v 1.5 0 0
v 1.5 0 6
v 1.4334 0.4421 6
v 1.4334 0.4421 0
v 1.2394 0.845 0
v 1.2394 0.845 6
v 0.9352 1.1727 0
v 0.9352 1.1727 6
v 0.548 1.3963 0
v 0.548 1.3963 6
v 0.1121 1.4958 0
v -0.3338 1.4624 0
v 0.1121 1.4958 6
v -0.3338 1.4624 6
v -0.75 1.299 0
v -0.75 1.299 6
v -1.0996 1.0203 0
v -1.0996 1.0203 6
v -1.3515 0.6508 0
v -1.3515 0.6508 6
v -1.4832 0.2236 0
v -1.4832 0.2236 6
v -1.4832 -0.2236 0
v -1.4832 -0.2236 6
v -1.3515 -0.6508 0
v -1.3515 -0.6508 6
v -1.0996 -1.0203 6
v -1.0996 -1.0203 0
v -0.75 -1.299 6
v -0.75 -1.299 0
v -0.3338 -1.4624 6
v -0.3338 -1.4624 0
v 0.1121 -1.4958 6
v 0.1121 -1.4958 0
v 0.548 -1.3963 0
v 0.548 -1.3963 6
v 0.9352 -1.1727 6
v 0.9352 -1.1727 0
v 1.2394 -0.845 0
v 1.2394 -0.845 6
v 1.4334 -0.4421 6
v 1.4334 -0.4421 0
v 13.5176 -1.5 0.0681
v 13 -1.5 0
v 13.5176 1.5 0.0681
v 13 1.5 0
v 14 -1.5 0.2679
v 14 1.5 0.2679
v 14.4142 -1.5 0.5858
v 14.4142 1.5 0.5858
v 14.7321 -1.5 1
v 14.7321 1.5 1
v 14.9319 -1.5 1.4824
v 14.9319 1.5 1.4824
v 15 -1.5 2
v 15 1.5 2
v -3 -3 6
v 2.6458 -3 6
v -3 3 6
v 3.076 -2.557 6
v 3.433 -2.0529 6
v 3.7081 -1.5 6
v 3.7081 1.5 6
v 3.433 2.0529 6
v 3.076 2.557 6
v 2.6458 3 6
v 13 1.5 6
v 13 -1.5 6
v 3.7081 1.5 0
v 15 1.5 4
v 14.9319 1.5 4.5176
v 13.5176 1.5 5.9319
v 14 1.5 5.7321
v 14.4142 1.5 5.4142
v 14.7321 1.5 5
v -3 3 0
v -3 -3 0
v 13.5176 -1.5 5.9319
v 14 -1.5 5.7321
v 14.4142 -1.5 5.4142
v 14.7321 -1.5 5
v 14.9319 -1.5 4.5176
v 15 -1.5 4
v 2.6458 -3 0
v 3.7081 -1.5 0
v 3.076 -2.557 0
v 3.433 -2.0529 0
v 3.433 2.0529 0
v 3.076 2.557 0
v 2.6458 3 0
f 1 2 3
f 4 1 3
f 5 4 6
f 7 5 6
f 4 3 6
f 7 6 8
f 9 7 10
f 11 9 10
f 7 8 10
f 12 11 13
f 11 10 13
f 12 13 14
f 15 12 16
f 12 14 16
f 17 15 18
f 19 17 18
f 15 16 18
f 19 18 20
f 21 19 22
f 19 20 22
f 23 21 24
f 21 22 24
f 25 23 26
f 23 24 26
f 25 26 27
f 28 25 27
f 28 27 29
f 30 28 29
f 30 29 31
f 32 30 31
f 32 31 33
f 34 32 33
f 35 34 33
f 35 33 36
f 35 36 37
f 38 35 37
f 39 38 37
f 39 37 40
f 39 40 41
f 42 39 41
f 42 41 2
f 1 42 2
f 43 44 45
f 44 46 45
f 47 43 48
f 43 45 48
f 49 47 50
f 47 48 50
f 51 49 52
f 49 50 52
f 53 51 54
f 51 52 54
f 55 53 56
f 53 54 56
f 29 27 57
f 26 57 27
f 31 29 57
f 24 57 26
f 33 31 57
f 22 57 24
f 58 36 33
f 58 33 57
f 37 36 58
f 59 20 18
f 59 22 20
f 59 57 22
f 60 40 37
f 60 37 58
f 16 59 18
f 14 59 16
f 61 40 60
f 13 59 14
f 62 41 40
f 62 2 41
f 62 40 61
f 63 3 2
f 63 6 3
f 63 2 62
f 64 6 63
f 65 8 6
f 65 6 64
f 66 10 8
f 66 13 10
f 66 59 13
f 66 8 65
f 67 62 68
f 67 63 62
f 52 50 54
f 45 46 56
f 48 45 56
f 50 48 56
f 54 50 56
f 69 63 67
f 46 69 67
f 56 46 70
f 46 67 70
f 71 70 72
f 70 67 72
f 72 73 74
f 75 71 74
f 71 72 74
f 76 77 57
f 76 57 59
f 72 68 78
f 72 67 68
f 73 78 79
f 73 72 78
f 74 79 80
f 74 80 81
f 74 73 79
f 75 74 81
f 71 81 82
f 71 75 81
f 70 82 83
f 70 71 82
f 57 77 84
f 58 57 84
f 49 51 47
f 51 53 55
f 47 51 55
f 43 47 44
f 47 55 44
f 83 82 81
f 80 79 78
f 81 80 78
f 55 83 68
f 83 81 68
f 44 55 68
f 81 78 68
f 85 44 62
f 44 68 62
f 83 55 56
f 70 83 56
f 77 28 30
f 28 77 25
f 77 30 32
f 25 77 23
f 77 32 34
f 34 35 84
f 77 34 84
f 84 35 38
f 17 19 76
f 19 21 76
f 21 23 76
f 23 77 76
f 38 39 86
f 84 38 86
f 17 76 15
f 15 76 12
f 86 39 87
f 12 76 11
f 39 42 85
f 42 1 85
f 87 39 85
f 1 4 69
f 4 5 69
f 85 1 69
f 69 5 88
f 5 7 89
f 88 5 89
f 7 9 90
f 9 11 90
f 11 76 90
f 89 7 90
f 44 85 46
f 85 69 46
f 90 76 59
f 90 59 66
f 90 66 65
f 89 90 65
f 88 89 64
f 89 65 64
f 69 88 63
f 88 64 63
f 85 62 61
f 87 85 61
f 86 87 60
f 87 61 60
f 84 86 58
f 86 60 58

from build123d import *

# Parameters (mm, degrees)
F0_W     = 18
F0_H     = 6
F1_DEPTH = 6
F2_R     = 1.5
F3_DEPTH = 10
F5_DEPTH = 25
F6_R     = 2


with BuildPart() as f1:
    # F0 (on Top) → F1 (new body)
    with BuildSketch(Plane.XY):
        with Locations((6, 0)):
            Rectangle(F0_W, F0_H)
    extrude(amount=F1_DEPTH)

    # F2 (on face) → F3 (cut)
    with BuildSketch(Plane.XY.offset(6)):
        Circle(F2_R)
    extrude(amount=-F3_DEPTH, mode=Mode.SUBTRACT)

    # F4 (on face) → F5 (cut)
    with BuildSketch(Plane.XY.offset(6)):
        with BuildLine():
            Line((3.708099, 1.5), (15, 1.5))
            Line((15, 1.5), (15, 3))
            Line((15, 3), (2.645751, 3))
            ThreePointArc((2.645751, 3), (3.264254, 2.311849), (3.708099, 1.5))
        make_face()
        with BuildLine():
            Line((15, -3), (15, -1.5))
            Line((15, -1.5), (3.708099, -1.5))
            ThreePointArc((3.708099, -1.5), (3.264254, -2.311849), (2.645751, -3))
            Line((2.645751, -3), (15, -3))
        make_face()
    extrude(amount=-F5_DEPTH, mode=Mode.SUBTRACT)

    # F6
    f6_edges = [f1.edges().sort_by_distance(p)[0] for p in [
        (15, 0, 6),
        (15, 0, 0),
    ]]
    fillet(f6_edges, radius=F6_R)


solid = f1.part
